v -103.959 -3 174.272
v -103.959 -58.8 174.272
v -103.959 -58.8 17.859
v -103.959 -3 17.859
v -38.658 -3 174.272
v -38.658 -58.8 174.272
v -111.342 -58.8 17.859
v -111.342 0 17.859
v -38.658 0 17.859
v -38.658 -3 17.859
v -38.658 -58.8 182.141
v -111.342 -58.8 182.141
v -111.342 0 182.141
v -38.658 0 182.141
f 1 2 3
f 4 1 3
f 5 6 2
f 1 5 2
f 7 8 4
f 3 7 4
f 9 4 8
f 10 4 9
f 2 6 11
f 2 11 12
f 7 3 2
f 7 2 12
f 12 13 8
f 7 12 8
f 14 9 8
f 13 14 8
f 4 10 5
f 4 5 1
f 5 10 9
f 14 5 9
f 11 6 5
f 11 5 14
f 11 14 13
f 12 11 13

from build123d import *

# Parameters (mm, degrees)
SKETCH1_R           = 28.1
BOSS_EXTRUDE1_DEPTH = 1
SKETCH2_R           = 18.6
CUT_EXTRUDE1_DEPTH  = 58.8
SKETCH3_W           = 222.683092022
SKETCH3_H           = 364.2827524
BOSS_EXTRUDE2_DEPTH = 58.8
SKETCH4_W           = 207.917403516
SKETCH4_H           = 348.54429772
CUT_EXTRUDE2_DEPTH  = 55.8
SKETCH9_R           = 3
CUT_EXTRUDE8_DEPTH  = 10
SKETCH10_R          = 3.75
CUT_EXTRUDE9_DEPTH  = 10
CUT_EXTRUDE13_DEPTH = 500
SKETCH6_R           = 3.75
CUT_EXTRUDE5_DEPTH  = 400
SKETCH8_R           = 10
CUT_EXTRUDE7_DEPTH  = 10


with BuildPart() as part:
    # Sketch1 → Boss-Extrude1 (new body)
    with BuildSketch(Plane(origin=(0, 0, 0), x_dir=(1, 0, 0), z_dir=(0, 1, 0))):
        Circle(SKETCH1_R)
    extrude(amount=BOSS_EXTRUDE1_DEPTH)

    # Sketch2 → Cut-Extrude1 (cut)
    with BuildSketch(Plane(origin=(0, 1, 0), x_dir=(1, 0, 0), z_dir=(0, 1, 0))):
        with Locations((0, -7)):
            Circle(SKETCH2_R)
    extrude(amount=-CUT_EXTRUDE1_DEPTH, mode=Mode.SUBTRACT)

    # Sketch3 → Boss-Extrude2 (add)
    with BuildSketch(Plane(origin=(0, 0, 0), x_dir=(-1, 0, 0), z_dir=(0, -1, 0))):
        Rectangle(SKETCH3_W, SKETCH3_H)
    extrude(amount=BOSS_EXTRUDE2_DEPTH)

    # Sketch4 → Cut-Extrude2 (cut)
    with BuildSketch(Plane(origin=(0, -58.8, 0), x_dir=(-1, 0, 0), z_dir=(0, -1, 0))):
        Rectangle(SKETCH4_W, SKETCH4_H)
    extrude(amount=-CUT_EXTRUDE2_DEPTH, mode=Mode.SUBTRACT)

    # Sketch9 → Cut-Extrude8 (cut)
    with BuildSketch(Plane(origin=(0, 0, 0), x_dir=(1, 0, 0), z_dir=(0, 1, 0))):
        with Locations((0, -7)):
            Circle(SKETCH9_R)
    extrude(amount=-CUT_EXTRUDE8_DEPTH, mode=Mode.SUBTRACT)

    # Sketch10 → Cut-Extrude9 (cut)
    with BuildSketch(Plane(origin=(0, 1, 0), x_dir=(1, 0, 0), z_dir=(0, 1, 0))):
        with Locations((0, 19.85)):
            Circle(SKETCH10_R)
    extrude(amount=-CUT_EXTRUDE9_DEPTH, mode=Mode.SUBTRACT)

    # Sketch11 → Cut-Extrude13 (cut)
    with BuildSketch(Plane(origin=(0, -58.8, 0), x_dir=(-1, 0, 0), z_dir=(0, -1, 0))):
        Polygon((38.658453989, -17.8586238), (38.658453989, -182.1413762), (-111.341546011, -182.1413762), (-111.341546011, 182.1413762), (111.341546011, 182.1413762), (111.341546011, -17.8586238), align=None)
    extrude(amount=-CUT_EXTRUDE13_DEPTH, mode=Mode.SUBTRACT)

    # Sketch6 → Cut-Extrude5 (cut)
    with BuildSketch(Plane(origin=(0, 1, 0), x_dir=(1, 0, 0), z_dir=(0, 1, 0))):
        with Locations((0, 18.75)):
            Circle(SKETCH6_R)
    extrude(amount=-CUT_EXTRUDE5_DEPTH, mode=Mode.SUBTRACT)

    # Sketch8 → Cut-Extrude7 (cut)
    with BuildSketch(Plane(origin=(0, 0, -182.1413762), x_dir=(-1, 0, 0), z_dir=(0, 0, -1))):
        with Locations((-86.573671766, -25.011155335)):
            Circle(SKETCH8_R)
    extrude(amount=-CUT_EXTRUDE7_DEPTH, mode=Mode.SUBTRACT)


solid = part.part
